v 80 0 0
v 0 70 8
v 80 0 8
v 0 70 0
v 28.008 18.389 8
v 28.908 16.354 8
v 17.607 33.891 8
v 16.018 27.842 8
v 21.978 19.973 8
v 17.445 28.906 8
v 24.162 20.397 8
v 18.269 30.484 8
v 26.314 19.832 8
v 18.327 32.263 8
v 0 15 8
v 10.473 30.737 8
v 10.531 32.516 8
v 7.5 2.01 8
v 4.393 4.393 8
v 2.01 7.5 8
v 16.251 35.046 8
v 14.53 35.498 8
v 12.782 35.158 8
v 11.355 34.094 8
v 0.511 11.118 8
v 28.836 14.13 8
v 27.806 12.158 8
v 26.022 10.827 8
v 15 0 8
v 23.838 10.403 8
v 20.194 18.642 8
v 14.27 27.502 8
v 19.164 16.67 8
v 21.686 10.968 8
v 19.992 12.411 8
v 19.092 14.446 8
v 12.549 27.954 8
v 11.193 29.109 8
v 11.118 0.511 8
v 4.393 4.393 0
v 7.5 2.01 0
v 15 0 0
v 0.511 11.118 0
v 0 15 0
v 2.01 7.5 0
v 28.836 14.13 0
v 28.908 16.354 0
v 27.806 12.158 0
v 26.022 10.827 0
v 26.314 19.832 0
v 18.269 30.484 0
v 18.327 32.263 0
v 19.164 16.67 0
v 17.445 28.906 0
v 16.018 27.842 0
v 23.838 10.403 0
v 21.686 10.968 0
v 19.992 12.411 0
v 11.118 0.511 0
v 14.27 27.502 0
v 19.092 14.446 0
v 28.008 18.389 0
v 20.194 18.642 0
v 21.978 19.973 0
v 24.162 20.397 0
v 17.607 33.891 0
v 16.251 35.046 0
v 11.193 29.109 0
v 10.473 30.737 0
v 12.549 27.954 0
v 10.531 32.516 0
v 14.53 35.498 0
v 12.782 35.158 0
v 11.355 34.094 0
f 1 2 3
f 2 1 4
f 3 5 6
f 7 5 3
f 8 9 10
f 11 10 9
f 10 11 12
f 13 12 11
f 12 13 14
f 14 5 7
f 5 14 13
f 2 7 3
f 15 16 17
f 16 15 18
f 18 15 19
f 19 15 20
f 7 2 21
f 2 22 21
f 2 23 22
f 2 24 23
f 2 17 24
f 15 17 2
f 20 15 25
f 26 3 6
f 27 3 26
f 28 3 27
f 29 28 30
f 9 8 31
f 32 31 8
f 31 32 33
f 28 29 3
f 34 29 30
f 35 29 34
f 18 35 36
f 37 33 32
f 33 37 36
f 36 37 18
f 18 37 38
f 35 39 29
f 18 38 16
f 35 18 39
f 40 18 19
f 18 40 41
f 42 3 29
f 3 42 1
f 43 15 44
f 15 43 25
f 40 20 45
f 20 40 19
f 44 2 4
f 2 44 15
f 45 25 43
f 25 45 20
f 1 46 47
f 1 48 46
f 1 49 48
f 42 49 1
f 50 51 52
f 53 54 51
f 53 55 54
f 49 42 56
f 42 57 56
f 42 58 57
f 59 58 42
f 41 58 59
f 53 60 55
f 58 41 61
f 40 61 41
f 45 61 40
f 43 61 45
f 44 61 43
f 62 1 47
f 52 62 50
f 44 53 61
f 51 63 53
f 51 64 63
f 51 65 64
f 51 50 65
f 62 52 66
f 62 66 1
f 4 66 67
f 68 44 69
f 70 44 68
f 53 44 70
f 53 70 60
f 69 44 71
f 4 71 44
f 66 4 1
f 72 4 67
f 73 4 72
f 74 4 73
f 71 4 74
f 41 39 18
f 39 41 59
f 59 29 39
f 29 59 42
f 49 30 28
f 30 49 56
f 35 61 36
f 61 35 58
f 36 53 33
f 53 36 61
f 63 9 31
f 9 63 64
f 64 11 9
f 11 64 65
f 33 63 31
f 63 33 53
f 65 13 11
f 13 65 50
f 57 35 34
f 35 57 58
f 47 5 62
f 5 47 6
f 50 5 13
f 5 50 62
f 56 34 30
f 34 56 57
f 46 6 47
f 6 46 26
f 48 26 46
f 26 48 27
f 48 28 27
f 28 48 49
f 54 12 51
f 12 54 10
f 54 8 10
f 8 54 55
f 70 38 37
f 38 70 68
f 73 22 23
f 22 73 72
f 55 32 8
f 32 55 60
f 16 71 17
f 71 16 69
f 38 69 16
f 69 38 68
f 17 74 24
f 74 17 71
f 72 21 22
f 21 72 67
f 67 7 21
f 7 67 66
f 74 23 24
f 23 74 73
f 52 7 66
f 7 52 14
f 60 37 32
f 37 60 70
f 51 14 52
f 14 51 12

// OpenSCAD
$fn = 32;

// ----------------------------------------------------------------------
// Bracket plate: corner pad 80 x 70, fillet R15
// ----------------------------------------------------------------------

// --- parameters (mm) ---
hole_r = 4;               // bolt hole radius
plate_t = 8;              // plate thickness, Z (extrusion height)
leg_a = 80;               // base leg
leg_b = 70;               // height leg
fillet_r = 15;            // right-angle fillet radius
fit_tol = 0.1;            // declared fit tolerance (prompt contract)
free_tol = 0.3;           // declared free tolerance (prompt contract)

hole_d1 = 2 * hole_r + 2;
hole_d2 = 2 * hole_r;

profile = [[15, 0], [80, 0], [0, 70], [0, 15], [0.511, 11.118], [2.01, 7.5], [4.393, 4.393], [7.5, 2.01], [11.118, 0.511]];  // primary outline, 9 points, counter clockwise
void_1 = [[28.908, 16.354], [28.008, 18.389], [26.314, 19.832], [24.162, 20.397], [21.978, 19.973], [20.194, 18.642], [19.164, 16.67], [19.092, 14.446], [19.992, 12.411], [21.686, 10.968], [23.838, 10.403], [26.022, 10.827], [27.806, 12.158], [28.836, 14.13]];  // mount hole 1, 14 points
void_2 = [[18.327, 32.263], [17.607, 33.891], [16.251, 35.046], [14.53, 35.498], [12.782, 35.158], [11.355, 34.094], [10.531, 32.516], [10.473, 30.737], [11.193, 29.109], [12.549, 27.954], [14.27, 27.502], [16.018, 27.842], [17.445, 28.906], [18.269, 30.484]];  // mount hole 2, 14 points

// --- the one profile operation ---
difference() {
  linear_extrude(height = plate_t) polygon(points = profile);
  translate([0, 0, -1])
    linear_extrude(height = plate_t + 2) polygon(points = void_1);
  translate([0, 0, -1])
    linear_extrude(height = plate_t + 2) polygon(points = void_2);
}
